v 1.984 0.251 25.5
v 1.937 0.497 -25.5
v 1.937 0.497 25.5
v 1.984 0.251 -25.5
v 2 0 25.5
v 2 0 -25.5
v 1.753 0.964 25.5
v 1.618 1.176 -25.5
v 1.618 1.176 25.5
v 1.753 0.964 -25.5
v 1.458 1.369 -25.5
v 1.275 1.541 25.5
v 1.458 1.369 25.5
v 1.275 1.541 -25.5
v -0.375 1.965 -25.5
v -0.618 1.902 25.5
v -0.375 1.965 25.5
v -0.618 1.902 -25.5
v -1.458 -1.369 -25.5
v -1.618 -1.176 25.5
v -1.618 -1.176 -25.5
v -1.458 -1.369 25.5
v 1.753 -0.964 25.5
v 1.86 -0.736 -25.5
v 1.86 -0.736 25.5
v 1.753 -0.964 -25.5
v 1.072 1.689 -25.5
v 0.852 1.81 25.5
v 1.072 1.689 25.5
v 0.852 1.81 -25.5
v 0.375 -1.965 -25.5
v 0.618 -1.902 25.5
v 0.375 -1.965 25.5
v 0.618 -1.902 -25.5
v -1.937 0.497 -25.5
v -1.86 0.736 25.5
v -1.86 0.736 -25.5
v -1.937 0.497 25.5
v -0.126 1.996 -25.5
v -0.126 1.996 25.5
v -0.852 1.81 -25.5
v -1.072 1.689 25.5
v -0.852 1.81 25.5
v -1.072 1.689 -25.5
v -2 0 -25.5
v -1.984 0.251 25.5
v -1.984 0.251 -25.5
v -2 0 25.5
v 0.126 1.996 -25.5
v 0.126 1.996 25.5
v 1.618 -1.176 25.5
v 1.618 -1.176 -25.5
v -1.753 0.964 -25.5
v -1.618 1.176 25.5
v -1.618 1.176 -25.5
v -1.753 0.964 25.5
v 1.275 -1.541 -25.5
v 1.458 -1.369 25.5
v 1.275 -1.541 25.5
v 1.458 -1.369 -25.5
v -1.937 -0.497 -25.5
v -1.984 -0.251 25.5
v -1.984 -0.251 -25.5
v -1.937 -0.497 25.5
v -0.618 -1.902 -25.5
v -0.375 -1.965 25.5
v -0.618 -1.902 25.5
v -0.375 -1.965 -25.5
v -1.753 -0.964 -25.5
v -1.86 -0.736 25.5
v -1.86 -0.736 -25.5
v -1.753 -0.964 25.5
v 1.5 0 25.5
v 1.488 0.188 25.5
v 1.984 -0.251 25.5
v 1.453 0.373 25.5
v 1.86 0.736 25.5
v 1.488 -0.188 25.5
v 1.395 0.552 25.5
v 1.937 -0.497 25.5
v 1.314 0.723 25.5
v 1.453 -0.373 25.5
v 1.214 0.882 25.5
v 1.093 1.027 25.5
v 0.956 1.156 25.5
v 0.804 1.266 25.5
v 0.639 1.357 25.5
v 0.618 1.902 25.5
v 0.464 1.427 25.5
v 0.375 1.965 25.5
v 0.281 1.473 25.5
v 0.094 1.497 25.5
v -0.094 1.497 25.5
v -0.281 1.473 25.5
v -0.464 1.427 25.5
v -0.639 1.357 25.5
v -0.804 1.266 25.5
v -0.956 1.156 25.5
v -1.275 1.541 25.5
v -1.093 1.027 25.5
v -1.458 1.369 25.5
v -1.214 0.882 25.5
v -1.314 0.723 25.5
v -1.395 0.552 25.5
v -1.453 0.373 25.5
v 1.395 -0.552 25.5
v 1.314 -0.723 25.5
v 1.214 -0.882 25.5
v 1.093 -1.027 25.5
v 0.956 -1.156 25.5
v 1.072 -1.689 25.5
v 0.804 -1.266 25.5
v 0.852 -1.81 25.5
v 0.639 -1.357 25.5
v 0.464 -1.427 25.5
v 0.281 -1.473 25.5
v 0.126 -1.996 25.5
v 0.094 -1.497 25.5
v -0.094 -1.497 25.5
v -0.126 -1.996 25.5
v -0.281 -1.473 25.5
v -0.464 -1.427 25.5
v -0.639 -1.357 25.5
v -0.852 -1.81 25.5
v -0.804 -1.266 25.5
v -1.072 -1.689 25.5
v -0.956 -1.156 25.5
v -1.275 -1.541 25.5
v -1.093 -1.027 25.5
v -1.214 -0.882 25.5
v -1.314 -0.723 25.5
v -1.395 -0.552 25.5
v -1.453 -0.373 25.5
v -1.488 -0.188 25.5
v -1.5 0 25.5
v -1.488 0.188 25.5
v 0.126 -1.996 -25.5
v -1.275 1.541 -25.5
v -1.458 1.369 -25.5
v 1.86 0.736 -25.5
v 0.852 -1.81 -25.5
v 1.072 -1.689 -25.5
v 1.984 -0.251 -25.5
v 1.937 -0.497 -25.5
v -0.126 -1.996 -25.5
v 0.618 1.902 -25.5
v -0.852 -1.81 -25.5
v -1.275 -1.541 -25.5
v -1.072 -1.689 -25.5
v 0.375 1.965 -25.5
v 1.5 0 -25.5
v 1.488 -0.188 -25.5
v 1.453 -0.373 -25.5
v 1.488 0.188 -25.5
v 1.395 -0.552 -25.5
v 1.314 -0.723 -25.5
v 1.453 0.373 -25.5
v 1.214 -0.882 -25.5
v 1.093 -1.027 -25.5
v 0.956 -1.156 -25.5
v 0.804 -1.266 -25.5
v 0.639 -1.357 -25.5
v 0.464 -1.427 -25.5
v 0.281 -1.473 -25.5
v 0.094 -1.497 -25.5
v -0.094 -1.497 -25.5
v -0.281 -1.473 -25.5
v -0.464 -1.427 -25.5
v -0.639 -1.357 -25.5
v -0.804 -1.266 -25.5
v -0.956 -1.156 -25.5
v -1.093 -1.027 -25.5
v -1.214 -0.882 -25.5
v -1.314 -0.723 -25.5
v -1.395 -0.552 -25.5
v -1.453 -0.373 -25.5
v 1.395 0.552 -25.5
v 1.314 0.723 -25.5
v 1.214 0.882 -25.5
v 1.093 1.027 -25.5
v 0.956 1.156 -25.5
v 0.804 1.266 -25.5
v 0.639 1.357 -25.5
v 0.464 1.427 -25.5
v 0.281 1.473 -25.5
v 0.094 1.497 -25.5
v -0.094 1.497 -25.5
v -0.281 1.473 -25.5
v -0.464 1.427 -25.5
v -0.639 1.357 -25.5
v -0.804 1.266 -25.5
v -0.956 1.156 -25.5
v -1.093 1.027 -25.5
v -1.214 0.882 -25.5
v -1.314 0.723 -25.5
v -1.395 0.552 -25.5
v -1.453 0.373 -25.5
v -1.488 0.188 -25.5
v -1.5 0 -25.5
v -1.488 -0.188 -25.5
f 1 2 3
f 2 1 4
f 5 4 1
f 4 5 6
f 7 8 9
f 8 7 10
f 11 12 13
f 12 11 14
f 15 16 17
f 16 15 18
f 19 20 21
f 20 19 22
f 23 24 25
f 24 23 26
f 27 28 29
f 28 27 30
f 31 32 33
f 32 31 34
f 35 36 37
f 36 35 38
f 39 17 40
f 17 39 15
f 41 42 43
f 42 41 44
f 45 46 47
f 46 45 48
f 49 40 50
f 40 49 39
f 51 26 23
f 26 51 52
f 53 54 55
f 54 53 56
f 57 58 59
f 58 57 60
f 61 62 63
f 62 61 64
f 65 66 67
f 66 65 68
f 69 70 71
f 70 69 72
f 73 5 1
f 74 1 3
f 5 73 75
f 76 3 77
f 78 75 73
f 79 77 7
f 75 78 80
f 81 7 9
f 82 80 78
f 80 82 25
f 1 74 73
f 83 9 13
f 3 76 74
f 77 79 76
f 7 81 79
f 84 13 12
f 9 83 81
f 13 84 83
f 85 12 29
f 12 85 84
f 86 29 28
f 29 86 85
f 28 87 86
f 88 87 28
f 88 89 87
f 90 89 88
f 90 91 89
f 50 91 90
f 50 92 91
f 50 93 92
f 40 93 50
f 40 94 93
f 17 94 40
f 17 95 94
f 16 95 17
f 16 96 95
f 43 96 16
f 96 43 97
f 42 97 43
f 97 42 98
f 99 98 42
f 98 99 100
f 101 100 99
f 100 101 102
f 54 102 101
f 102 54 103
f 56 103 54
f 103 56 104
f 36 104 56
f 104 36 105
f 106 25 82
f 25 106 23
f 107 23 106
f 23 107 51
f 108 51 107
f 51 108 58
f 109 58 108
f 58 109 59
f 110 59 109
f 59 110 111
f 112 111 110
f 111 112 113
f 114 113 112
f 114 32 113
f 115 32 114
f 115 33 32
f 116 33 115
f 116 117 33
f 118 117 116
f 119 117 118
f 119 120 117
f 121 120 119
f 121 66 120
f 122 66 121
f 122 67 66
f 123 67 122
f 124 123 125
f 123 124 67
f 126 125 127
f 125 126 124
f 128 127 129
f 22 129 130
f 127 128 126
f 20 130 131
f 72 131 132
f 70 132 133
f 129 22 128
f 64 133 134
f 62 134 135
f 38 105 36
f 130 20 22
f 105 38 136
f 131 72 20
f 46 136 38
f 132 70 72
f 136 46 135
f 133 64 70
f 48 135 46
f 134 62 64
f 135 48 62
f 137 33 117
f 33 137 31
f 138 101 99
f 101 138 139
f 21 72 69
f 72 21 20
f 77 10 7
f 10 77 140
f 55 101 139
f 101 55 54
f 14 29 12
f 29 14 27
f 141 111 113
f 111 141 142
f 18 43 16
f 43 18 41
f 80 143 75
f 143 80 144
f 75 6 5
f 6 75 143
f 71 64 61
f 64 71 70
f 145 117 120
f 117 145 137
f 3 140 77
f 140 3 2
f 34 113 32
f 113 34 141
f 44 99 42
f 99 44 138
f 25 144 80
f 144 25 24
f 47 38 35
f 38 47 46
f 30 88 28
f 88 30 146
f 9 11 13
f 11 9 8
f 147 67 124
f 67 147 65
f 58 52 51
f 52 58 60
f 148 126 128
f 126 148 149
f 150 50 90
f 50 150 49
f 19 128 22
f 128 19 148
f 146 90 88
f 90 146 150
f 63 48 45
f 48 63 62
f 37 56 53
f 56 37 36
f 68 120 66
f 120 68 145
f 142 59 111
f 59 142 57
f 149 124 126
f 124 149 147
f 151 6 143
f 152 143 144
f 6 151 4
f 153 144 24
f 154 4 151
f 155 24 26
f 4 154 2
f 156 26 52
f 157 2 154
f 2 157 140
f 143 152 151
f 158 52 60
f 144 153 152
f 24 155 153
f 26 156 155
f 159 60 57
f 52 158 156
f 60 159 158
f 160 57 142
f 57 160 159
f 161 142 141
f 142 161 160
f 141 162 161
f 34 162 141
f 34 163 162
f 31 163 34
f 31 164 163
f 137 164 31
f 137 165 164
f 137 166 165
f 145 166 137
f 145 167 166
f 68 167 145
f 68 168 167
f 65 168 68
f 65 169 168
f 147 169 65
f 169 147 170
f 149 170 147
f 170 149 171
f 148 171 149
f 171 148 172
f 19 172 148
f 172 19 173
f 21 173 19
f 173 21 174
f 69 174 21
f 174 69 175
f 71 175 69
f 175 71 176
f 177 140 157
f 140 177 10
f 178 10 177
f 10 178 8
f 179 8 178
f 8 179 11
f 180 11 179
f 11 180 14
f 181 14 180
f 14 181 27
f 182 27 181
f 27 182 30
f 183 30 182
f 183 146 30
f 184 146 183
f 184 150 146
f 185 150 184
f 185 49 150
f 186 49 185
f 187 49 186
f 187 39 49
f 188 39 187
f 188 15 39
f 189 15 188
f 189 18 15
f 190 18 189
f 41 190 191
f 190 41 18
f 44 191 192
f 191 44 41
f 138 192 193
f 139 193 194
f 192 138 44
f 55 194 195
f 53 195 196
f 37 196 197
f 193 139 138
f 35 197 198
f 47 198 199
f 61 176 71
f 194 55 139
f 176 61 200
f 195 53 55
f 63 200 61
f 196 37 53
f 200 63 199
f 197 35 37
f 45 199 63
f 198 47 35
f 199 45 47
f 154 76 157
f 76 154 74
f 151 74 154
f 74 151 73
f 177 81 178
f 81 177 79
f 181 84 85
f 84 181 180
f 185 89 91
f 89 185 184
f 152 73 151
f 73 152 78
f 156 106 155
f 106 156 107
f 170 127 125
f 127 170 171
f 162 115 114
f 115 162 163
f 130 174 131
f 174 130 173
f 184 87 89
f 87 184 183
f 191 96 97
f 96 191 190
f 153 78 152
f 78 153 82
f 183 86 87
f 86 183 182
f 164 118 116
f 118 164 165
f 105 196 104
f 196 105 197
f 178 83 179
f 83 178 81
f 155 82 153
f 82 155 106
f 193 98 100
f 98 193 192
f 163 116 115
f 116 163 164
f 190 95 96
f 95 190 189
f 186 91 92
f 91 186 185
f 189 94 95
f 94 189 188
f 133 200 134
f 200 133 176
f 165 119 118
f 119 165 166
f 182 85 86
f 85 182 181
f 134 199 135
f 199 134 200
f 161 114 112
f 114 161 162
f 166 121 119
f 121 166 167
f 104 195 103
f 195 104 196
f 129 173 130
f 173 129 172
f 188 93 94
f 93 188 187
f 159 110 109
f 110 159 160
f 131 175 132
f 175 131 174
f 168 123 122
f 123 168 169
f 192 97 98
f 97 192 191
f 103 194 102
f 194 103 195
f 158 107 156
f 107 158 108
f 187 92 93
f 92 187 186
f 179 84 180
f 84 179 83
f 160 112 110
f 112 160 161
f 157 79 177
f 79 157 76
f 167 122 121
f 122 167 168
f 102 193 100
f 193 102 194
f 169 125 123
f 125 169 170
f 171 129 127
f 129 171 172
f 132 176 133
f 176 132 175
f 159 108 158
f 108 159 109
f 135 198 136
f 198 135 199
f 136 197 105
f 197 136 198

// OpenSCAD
$fn = 50;


difference() {
	union() {
		translate(v = [0, 0, -25.5000000000]) {
			cylinder(h = 51, r = 2.0000000000);
		}
	}
	union() {
		translate(v = [0, 0, -100.0000000000]) {
			cylinder(h = 200, r = 1.5000000000);
		}
	}
}
